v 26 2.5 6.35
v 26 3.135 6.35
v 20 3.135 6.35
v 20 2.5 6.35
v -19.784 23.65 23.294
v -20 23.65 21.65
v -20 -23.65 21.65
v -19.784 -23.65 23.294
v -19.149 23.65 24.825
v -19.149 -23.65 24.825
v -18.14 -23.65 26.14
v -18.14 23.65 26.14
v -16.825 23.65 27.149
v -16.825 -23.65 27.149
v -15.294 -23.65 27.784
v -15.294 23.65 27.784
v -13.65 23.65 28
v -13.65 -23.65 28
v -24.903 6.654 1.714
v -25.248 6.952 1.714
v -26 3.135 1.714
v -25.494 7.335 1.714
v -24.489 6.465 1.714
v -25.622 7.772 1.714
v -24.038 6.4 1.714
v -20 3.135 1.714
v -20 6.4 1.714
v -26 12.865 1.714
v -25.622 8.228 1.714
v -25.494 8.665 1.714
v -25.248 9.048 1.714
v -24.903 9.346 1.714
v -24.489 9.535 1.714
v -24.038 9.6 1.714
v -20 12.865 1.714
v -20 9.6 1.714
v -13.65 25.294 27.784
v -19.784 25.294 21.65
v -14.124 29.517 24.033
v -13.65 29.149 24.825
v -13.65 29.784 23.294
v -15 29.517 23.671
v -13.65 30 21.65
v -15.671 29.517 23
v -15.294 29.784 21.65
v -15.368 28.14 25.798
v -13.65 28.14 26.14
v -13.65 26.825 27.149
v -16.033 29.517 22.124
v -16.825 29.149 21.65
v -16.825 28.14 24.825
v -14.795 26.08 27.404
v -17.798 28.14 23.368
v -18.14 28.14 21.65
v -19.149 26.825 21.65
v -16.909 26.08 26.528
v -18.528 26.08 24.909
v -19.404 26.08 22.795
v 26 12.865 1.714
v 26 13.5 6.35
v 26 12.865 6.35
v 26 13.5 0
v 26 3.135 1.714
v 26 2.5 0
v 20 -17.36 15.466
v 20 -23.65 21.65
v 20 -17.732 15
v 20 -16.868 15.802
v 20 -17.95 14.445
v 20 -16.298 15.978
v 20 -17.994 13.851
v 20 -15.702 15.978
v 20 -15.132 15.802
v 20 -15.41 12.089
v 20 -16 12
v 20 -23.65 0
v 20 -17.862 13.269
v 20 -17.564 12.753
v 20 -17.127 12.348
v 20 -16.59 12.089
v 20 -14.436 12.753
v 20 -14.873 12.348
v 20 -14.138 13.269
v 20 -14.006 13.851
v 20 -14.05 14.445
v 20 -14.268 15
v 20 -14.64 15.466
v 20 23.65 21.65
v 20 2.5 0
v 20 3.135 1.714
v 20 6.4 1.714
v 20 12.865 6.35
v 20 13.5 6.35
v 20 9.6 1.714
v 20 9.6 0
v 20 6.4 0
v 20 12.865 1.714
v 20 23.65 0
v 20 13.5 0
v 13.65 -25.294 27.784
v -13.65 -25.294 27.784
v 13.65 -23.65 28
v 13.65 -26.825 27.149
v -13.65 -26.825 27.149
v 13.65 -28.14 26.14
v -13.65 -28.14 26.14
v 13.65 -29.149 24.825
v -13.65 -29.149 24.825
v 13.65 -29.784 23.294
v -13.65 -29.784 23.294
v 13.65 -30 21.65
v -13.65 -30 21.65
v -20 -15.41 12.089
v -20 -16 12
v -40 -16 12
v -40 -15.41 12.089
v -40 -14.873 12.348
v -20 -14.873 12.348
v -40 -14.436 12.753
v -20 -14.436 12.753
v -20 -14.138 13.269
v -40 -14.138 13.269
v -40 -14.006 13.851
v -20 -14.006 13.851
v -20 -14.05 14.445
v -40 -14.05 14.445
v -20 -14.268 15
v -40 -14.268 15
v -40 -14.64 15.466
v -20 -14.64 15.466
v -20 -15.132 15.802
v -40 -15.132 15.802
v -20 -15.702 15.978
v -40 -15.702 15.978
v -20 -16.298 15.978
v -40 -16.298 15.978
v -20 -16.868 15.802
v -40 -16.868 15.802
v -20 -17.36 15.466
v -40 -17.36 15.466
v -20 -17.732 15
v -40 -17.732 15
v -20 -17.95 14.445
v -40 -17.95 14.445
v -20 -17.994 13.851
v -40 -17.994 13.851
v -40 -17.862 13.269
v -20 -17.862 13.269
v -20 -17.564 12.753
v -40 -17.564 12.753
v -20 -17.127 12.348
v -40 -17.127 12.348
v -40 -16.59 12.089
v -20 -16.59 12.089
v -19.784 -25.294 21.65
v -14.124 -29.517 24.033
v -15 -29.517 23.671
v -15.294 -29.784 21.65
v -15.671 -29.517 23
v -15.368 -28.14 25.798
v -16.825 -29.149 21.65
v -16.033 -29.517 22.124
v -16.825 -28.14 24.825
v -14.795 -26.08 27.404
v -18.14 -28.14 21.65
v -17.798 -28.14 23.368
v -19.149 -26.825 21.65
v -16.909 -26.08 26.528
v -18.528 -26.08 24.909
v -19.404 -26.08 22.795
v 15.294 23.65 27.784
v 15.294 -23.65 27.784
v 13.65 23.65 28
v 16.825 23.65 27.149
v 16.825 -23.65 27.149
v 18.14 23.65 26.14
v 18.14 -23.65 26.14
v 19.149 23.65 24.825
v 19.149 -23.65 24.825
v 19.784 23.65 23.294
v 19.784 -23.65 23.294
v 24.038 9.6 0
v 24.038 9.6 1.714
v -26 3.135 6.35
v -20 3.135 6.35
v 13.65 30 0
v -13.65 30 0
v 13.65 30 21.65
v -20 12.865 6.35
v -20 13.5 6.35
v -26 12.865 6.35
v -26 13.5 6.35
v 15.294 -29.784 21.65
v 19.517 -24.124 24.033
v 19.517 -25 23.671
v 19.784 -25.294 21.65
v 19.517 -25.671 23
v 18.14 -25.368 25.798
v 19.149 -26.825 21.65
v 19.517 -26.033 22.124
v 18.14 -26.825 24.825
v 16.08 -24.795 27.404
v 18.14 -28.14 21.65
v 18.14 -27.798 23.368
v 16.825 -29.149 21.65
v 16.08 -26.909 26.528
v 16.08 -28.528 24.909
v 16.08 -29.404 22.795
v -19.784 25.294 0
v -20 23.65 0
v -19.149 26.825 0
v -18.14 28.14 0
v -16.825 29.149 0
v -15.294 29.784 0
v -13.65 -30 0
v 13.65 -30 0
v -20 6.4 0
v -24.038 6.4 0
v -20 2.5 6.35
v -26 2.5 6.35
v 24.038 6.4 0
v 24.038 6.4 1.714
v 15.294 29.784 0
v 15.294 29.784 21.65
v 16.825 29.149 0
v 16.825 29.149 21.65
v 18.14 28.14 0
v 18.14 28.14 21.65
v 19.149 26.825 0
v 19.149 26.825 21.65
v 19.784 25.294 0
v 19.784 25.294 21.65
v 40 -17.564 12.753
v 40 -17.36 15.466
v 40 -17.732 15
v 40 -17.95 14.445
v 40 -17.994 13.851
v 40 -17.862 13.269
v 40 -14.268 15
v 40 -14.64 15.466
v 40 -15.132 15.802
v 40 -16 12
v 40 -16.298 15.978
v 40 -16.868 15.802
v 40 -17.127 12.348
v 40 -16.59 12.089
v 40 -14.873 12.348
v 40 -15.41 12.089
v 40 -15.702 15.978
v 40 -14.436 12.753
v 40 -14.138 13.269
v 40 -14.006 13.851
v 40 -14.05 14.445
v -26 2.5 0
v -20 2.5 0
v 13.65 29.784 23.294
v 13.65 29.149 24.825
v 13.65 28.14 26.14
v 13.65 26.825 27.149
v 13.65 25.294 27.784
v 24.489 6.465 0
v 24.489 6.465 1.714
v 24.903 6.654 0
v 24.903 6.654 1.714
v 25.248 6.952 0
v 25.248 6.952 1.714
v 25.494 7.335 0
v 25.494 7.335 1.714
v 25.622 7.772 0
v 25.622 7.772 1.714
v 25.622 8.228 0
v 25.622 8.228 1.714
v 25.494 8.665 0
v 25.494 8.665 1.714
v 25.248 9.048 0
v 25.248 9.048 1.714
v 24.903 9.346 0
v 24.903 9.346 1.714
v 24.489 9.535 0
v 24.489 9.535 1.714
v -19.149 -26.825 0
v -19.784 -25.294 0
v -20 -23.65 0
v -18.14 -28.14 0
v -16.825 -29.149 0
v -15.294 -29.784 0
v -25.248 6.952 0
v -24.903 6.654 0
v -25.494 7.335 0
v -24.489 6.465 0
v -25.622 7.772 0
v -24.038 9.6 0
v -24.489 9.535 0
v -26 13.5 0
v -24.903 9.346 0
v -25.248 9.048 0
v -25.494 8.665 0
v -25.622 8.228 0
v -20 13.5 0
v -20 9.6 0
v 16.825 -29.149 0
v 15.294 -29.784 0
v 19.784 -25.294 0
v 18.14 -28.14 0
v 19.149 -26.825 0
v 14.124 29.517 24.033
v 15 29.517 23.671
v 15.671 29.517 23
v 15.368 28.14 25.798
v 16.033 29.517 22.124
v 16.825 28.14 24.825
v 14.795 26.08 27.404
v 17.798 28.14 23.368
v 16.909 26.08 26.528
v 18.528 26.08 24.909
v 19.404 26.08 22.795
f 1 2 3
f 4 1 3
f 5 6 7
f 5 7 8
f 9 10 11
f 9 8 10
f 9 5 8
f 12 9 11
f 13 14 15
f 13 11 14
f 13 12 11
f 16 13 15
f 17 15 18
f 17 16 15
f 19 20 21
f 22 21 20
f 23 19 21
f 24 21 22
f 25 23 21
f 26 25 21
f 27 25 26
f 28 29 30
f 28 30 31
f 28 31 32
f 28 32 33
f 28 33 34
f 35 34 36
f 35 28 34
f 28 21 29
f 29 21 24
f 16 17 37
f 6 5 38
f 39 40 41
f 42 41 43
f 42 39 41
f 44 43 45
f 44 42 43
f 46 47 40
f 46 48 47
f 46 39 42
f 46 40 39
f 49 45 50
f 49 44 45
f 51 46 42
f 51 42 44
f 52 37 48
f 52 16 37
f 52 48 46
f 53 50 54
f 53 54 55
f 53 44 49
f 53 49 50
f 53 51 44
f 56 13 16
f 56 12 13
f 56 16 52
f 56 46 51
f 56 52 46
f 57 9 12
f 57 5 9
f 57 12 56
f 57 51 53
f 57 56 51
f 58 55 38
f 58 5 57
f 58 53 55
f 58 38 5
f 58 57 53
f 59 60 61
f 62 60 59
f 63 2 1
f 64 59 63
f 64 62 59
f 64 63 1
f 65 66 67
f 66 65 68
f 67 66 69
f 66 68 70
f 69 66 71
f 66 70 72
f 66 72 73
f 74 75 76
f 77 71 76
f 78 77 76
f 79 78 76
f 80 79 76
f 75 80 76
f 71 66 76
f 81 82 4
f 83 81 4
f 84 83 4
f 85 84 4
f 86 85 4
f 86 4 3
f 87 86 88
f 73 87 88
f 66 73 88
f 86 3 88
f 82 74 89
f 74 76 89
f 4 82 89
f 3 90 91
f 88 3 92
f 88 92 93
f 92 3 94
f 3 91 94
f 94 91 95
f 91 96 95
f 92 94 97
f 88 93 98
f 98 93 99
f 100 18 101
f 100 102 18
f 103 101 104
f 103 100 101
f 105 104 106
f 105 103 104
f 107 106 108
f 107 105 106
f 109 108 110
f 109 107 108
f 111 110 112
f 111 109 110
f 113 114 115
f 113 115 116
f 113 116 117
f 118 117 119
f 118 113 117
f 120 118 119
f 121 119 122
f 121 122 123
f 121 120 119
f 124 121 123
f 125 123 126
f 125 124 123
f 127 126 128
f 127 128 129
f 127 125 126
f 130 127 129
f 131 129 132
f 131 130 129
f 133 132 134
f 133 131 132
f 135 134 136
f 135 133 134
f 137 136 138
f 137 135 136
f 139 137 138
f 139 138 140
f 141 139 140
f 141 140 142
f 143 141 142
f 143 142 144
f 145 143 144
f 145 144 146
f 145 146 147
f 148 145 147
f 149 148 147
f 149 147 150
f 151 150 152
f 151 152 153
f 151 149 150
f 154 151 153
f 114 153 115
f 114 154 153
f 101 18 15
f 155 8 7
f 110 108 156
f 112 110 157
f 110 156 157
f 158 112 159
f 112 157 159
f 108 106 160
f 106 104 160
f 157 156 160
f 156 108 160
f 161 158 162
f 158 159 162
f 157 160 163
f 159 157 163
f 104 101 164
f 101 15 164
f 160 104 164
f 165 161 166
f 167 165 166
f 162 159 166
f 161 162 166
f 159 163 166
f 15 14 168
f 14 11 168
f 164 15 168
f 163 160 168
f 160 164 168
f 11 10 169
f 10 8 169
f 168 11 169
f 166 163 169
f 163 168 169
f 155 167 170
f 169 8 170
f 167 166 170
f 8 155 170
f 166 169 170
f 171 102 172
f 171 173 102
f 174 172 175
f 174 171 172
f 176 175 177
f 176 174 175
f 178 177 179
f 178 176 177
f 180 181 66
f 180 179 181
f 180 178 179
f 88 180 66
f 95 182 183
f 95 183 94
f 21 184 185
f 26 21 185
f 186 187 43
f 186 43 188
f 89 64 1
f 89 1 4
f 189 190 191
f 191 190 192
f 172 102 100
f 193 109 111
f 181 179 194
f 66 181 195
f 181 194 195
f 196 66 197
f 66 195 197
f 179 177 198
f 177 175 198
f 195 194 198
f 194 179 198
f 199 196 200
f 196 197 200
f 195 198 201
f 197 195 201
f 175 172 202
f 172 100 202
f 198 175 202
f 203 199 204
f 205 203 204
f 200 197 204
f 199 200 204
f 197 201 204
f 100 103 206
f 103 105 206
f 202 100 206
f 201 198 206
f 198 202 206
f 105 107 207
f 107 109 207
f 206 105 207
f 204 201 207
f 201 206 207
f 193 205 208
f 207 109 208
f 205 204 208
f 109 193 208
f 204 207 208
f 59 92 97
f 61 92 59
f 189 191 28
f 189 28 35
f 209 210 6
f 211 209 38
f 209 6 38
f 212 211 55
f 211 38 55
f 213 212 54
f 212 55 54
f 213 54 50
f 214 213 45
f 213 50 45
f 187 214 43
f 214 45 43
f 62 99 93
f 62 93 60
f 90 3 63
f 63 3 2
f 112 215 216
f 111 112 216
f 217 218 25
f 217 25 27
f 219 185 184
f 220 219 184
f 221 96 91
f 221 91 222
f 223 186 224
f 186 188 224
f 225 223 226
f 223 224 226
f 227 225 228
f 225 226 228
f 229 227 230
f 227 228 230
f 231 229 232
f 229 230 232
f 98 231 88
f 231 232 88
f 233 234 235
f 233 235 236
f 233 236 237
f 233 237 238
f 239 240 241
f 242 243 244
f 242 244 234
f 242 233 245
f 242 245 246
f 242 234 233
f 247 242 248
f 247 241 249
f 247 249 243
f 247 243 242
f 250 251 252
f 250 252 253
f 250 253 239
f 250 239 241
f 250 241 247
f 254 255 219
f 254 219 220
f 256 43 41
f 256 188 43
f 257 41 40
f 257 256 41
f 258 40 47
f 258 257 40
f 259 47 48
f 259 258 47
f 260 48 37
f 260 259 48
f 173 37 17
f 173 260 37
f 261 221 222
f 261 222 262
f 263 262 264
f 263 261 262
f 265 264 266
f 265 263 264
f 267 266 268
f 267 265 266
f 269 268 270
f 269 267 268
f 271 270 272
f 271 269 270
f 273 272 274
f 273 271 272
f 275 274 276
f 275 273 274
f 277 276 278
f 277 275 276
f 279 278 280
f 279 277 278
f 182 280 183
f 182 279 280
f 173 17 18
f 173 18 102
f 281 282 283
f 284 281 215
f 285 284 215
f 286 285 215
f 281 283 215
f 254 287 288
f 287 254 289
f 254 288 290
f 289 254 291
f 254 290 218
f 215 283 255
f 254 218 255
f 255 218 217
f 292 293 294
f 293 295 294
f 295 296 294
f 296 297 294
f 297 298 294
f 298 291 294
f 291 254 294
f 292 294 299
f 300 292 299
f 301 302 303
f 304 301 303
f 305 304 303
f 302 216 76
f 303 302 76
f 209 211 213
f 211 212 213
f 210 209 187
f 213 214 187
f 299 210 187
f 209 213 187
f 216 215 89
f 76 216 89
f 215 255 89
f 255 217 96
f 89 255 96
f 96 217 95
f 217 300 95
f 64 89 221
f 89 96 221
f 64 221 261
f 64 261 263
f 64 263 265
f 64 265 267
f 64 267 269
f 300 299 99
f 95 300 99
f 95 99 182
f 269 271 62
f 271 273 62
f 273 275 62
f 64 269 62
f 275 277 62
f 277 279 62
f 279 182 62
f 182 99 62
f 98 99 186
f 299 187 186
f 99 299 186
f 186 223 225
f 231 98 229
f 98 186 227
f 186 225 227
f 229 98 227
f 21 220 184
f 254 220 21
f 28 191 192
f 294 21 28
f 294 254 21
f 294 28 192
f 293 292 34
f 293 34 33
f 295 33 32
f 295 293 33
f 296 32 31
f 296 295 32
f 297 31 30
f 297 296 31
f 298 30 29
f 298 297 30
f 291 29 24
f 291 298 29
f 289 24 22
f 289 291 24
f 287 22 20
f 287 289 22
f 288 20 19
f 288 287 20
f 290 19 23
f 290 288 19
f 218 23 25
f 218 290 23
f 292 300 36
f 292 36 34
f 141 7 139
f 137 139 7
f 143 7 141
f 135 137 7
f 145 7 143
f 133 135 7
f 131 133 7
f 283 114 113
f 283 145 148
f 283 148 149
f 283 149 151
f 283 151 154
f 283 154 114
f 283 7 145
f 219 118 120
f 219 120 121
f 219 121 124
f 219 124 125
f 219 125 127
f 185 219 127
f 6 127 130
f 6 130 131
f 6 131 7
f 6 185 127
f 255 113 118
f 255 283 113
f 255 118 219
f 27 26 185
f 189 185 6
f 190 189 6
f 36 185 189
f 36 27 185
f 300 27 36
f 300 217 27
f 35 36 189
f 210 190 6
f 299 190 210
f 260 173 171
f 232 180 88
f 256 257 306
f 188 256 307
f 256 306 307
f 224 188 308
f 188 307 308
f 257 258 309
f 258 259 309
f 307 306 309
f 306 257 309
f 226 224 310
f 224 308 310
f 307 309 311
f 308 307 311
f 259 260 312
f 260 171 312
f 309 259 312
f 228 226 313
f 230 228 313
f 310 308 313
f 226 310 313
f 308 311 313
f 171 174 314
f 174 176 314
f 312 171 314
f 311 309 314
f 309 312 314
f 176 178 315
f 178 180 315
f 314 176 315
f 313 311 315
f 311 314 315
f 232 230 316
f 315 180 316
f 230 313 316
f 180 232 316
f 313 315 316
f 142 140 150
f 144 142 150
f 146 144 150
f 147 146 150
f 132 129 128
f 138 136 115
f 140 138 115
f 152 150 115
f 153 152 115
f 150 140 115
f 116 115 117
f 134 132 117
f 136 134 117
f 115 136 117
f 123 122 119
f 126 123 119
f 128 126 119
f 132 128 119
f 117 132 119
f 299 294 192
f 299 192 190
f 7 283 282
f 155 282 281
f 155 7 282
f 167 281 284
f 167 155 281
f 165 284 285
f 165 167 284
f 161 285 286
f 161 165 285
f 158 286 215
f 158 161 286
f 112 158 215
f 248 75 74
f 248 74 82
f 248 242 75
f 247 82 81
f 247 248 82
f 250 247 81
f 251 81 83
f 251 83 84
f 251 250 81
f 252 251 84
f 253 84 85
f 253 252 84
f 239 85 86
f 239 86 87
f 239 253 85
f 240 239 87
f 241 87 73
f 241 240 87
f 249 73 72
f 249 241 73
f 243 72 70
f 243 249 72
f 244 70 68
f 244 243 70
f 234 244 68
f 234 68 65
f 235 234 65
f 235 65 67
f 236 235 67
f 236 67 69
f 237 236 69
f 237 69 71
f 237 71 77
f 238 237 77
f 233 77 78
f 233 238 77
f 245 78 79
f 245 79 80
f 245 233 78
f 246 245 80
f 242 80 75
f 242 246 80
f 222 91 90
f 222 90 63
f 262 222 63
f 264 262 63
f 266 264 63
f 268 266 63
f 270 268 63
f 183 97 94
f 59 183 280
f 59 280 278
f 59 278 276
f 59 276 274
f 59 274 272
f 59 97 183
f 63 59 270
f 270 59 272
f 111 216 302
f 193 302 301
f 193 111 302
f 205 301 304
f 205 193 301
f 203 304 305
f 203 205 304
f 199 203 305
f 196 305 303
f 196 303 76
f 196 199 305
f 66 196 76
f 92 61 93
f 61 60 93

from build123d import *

# Parameters (mm, degrees)
SKETCH1_W           = 40
SKETCH1_H           = 60
BOSS_EXTRUDE1_DEPTH = 28
BOSS_EXTRUDE2_DEPTH = 6.35
FILLET1_R           = 6.35
SKETCH4_W           = 8.790315594
SKETCH4_H           = 9.73
CUT_EXTRUDE1_DEPTH  = 4.6355
SKETCH5_R           = 2
BOSS_EXTRUDE3_DEPTH = 40


with BuildPart() as part:
    # Sketch1 → Boss-Extrude1 (new body)
    with BuildSketch(Plane.XY):
        Rectangle(SKETCH1_W, SKETCH1_H)
    extrude(amount=BOSS_EXTRUDE1_DEPTH)

    # Sketch2 → Boss-Extrude2 (add)
    with BuildSketch(Plane(origin=(0, 0, 0), x_dir=(-1, 0, 0), z_dir=(0, 0, -1))):
        with BuildLine():
            Line((-20, 9.6), (-20, 13.5))
            Line((-20, 13.5), (-26, 13.5))
            Line((-26, 13.5), (-26, 2.5))
            Line((-26, 2.5), (-20, 2.5))
            Line((-20, 2.5), (-20, 6.4))
            Line((-20, 6.4), (-24.038303444, 6.4))
            ThreePointArc((-24.038303444, 6.4), (-25.638303444, 8), (-24.038303444, 9.6))
            Line((-24.038303444, 9.6), (-20, 9.6))
        make_face()
        with BuildLine():
            Line((24.038303444, 6.4), (20, 6.4))
            Line((20, 6.4), (20, 2.5))
            Line((20, 2.5), (26, 2.5))
            Line((26, 2.5), (26, 13.5))
            Line((26, 13.5), (20, 13.5))
            Line((20, 13.5), (20, 9.6))
            Line((20, 9.6), (24.038303444, 9.6))
            ThreePointArc((24.038303444, 9.6), (25.638303444, 8), (24.038303444, 6.4))
        make_face()
    extrude(amount=-BOSS_EXTRUDE2_DEPTH)

    # Fillet1
    fillet1_edges = [part.edges().sort_by_distance(p)[0] for p in [
        (-20, 0, 28),
        (0, -30, 28),
        (20, 0, 28),
        (0, 30, 28),
        (20, -30, 14),
        (-20, -30, 14),
        (-20, 30, 14),
        (20, 30, 14),
    ]]
    fillet(fillet1_edges, radius=FILLET1_R)

    # Sketch4 → Cut-Extrude1 (cut)
    with BuildSketch(Plane.XY.offset(6.35)):
        with Locations((-24.395157797, 8)):
            Rectangle(SKETCH4_W, SKETCH4_H)
        with Locations((24.395157797, 8)):
            Rectangle(SKETCH4_W, SKETCH4_H)
    extrude(amount=-CUT_EXTRUDE1_DEPTH, mode=Mode.SUBTRACT)

    # Sketch5 → Boss-Extrude3 (add, symmetric)
    with BuildSketch(Plane(origin=(0, 0, 0), x_dir=(0, 0, -1), z_dir=(1, 0, 0))):
        with Locations((-14, -16)):
            Circle(SKETCH5_R)
    extrude(amount=BOSS_EXTRUDE3_DEPTH, both=True)


solid = part.part
